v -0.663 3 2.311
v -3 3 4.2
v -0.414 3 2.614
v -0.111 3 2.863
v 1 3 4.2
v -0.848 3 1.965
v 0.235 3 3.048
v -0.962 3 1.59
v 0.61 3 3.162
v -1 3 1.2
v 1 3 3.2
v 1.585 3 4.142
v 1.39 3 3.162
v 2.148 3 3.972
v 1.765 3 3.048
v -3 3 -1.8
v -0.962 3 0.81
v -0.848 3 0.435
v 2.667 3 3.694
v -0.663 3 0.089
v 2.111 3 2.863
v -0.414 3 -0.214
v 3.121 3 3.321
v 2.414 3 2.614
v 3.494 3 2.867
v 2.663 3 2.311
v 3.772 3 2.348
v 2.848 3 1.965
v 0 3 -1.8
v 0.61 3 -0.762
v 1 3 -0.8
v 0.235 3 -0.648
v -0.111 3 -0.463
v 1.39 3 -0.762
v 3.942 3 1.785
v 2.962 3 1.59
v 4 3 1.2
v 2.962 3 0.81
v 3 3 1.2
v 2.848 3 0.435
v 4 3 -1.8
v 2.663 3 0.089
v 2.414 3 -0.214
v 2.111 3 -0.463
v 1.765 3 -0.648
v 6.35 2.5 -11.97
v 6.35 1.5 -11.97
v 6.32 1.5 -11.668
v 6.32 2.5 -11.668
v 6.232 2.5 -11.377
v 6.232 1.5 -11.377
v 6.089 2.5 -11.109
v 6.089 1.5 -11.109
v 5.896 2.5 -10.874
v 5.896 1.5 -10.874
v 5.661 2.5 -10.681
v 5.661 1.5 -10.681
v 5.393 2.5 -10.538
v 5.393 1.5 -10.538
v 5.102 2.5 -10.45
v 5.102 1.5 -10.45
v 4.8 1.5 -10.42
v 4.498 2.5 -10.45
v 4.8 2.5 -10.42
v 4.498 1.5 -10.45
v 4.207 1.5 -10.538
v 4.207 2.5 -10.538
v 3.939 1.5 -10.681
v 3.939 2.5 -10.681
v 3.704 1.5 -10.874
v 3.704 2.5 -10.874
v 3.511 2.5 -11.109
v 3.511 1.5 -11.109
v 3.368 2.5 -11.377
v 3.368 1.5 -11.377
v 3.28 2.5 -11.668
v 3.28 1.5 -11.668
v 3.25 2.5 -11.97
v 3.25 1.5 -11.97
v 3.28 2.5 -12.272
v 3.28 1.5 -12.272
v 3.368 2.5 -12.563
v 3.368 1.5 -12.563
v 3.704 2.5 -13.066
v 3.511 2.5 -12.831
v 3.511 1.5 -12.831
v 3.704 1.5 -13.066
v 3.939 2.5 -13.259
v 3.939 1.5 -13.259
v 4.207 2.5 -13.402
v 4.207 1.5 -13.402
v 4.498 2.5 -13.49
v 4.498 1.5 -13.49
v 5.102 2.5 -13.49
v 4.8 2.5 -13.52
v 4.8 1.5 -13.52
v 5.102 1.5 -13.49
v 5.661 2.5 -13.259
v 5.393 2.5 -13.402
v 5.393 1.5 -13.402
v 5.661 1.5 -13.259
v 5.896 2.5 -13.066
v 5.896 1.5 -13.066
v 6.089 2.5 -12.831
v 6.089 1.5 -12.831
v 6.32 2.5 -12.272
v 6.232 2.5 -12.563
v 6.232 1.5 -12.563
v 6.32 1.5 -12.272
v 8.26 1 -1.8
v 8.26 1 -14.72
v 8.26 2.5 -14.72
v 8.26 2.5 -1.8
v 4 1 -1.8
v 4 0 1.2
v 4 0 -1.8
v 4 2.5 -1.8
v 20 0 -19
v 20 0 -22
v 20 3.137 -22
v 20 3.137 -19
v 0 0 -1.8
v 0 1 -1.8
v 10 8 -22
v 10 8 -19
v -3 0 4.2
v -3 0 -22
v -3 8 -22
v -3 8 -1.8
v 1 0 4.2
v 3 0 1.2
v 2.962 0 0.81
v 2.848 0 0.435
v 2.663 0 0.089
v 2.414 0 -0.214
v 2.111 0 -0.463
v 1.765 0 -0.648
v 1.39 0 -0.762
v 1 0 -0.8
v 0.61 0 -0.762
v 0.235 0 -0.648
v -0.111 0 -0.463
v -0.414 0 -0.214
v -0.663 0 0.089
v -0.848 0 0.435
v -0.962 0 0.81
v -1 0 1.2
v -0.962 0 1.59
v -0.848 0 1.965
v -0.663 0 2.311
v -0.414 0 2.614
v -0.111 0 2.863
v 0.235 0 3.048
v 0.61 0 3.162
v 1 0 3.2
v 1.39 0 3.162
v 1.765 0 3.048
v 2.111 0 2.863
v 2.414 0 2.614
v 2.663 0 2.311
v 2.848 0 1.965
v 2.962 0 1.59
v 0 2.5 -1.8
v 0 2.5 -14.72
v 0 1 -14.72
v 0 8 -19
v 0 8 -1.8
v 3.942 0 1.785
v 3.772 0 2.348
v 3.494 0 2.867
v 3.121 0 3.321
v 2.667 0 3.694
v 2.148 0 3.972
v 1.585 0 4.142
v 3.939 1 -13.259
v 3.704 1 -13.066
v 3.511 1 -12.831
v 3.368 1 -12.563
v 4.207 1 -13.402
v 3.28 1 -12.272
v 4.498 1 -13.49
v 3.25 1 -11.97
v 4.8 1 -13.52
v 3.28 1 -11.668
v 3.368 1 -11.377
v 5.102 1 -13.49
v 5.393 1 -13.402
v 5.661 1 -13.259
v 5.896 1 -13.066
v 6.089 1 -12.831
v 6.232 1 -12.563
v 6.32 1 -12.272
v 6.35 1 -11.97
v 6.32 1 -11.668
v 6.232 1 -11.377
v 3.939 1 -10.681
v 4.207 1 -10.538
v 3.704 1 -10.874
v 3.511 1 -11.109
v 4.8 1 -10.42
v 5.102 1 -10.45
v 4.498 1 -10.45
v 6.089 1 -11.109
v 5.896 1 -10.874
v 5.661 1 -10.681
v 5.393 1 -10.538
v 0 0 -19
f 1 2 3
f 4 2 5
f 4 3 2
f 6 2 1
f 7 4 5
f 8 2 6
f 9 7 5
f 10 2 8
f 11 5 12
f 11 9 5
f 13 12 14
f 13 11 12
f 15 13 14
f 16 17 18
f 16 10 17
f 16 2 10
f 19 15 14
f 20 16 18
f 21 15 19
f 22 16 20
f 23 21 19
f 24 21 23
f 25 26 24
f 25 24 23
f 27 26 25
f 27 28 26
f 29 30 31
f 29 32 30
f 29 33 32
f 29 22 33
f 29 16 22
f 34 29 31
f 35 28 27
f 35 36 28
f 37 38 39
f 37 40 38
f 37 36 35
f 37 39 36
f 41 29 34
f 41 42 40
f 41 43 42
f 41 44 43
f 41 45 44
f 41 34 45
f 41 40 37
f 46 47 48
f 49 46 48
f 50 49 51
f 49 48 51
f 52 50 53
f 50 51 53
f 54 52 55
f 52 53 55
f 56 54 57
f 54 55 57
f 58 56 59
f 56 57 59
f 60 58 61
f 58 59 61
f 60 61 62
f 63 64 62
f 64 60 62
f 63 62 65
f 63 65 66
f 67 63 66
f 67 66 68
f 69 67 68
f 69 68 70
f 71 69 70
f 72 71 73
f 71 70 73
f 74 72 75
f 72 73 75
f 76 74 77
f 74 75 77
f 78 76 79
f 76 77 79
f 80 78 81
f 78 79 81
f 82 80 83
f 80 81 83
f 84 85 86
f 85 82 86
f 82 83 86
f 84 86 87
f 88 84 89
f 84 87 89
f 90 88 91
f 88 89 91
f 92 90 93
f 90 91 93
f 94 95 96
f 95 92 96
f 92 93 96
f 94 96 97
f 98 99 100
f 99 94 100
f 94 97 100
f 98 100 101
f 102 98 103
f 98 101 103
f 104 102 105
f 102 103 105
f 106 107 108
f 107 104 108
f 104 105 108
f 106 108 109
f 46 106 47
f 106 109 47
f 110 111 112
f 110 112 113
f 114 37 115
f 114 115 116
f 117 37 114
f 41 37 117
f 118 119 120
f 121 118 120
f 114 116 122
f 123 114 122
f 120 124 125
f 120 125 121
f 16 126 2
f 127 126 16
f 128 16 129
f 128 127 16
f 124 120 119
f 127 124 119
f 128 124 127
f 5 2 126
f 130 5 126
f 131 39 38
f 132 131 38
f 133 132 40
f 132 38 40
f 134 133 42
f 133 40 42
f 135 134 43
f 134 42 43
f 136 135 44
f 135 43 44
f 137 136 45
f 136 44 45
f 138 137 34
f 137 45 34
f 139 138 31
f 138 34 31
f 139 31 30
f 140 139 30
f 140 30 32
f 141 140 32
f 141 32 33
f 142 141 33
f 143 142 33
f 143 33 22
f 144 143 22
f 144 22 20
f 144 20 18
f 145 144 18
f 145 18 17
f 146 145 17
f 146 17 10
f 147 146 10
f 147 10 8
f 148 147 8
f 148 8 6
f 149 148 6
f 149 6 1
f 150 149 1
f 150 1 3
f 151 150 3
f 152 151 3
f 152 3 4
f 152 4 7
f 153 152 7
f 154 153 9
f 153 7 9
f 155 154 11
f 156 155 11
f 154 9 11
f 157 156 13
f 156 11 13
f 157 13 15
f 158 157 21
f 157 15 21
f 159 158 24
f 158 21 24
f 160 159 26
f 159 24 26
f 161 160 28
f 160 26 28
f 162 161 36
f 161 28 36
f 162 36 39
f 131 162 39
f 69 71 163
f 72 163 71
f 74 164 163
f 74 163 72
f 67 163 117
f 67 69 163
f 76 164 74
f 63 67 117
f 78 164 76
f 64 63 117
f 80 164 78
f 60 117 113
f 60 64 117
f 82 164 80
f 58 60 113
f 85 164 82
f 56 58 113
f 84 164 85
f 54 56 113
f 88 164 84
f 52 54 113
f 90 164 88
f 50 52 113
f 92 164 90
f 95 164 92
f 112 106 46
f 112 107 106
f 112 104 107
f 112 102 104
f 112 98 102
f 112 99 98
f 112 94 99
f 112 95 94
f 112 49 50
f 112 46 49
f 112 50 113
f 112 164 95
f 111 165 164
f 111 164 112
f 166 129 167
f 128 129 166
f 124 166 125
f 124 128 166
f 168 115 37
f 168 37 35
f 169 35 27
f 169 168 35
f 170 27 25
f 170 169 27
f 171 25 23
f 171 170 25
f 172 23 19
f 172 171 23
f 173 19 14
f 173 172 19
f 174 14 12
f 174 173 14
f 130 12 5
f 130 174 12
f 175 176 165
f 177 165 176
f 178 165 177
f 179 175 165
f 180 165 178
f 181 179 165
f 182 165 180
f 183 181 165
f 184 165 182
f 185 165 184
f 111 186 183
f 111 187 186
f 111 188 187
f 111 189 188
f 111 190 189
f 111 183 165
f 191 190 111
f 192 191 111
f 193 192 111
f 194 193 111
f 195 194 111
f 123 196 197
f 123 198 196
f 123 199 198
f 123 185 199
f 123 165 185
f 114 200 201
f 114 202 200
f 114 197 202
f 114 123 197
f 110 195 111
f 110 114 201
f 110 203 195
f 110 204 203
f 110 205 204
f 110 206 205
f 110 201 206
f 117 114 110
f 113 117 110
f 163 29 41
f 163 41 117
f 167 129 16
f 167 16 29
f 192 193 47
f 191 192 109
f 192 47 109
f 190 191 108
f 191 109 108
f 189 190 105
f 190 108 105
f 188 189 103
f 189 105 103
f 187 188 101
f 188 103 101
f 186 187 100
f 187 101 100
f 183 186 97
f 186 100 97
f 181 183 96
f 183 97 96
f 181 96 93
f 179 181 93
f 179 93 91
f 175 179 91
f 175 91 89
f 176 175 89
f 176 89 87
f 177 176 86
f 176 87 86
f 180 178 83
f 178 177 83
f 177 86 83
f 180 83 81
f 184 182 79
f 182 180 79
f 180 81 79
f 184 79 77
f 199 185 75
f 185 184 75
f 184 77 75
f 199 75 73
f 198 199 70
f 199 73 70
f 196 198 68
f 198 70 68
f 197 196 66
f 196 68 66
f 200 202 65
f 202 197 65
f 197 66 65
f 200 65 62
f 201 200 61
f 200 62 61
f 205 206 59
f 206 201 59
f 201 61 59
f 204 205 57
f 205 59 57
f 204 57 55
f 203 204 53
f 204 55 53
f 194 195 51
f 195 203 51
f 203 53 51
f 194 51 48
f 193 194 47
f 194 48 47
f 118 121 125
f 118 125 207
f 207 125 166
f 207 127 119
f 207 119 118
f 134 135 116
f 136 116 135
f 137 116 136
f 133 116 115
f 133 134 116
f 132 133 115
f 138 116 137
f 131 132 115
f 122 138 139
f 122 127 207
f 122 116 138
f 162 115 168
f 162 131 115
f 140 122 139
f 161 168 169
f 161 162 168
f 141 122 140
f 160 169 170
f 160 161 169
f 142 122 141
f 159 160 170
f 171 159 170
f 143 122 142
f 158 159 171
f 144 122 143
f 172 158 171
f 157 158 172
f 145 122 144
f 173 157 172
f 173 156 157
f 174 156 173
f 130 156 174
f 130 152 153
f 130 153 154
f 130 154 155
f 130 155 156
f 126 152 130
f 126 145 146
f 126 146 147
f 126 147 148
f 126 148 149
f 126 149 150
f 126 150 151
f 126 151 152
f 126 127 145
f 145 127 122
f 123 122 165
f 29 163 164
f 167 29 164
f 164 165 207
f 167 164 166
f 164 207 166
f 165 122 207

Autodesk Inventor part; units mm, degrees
ref_plane "YZ Plane" through (0, 0, 0) normal (1, 0, 0) x (0, 1, 0)
ref_plane "XZ Plane" through (0, 0, 0) normal (0, 1, 0) x (-1, 0, 0)
ref_plane "XY Plane" through (0, 0, 0) normal (0, 0, 1) x (1, 0, 0)
sketch "Szkic1" plane through (0, 0, 0) normal (0, 1, 0) x (-1, 0, 0)
  line L0 (0, 0) -> (3, 0)
  line L1 (3, 0) -> (3, -22)
  line L2 (3, -22) -> (0, -22)
  line L3 (0, -22) -> (0, 0)
  line L4 (0, 0) -> (-3, 0)
  line L5 (-3, 0) -> (-3, -5)
  line L6 (-3, -5) -> (0, -5)
  line L7 (0, -5) -> (0, 0)
  line L8 (0, -22) -> (-20, -22)
  line L9 (-20, -22) -> (-20, -19)
  line L10 (-20, -19) -> (0, -19)
  line L11 (0, -19) -> (0, -22)
  dimension "d0" = 3
  dimension "d1" = 22
  dimension "d2" = 3
  dimension "d3" = 5
  dimension "d4" = 20
  dimension "d5" = 3
extrude "Wyciągnięcie proste1" add sketch "Szkic1" along normal blind 8
sketch "Szkic2" plane through (0, 0, -19) normal (0, 0, 1) x (1, 0, 0)
  line L0 (20, 0) -> (20, 8) projected
  line L1 (20, 0) -> (0, 8)
  line L2 (20, 8) -> (-3, 8) projected
  point P0 (0, 0)
extrude "Wyciągnięcie proste2" cut sketch "Szkic2" against normal blind 3
sketch "Szkic3" plane through (-3, 0, 0) normal (0, 0, 1) x (1, 0, 0)
  line L0 (0, 0) -> (0, 8) projected
  line L1 (0, 0) -> (6, 0)
  line L2 (6, 0) -> (6, 8)
  line L3 (6, 8) -> (0, 8)
  line L4 (0, 8) -> (0, 0)
  point P0 (3, 0)
extrude "Wyciągnięcie proste3" add sketch "Szkic3" along normal blind 4.2
sketch "Szkic4" plane through (3, 0, -5) normal (0, 0, -1) x (-1, 0, 0)
  line L0 (0, 0) -> (0, 8) projected
  line L1 (3, 0) -> (3, 8) projected
  line L2 (0, 8) -> (3, 8)
  line L3 (3, 8) -> (3, 0)
  line L4 (3, 0) -> (0, 0)
  line L5 (0, 0) -> (0, 8)
extrude "Wyciągnięcie proste4" cut sketch "Szkic4" against normal blind 3.2
sketch "Szkic6" plane through (3, 0, 4.2) normal (1, 0, 0) x (0, 0, -1)
  line L0 (0, 8) -> (0, 0) projected
  line L1 (23.2, 0) -> (6, 0) projected
  line L2 (0, 8) -> (6, 8)
  line L3 (6, 8) -> (6, 0)
  line L4 (6, 0) -> (0, 0)
  line L5 (0, 0) -> (0, 8)
  point P0 (4.2, 0)
extrude "Wyciągnięcie proste7" add sketch "Szkic6" along normal blind 2
sketch "Szkic7" plane through (0, 8, 0) normal (0, 1, 0) x (1, 0, 0)
  circle A0 centre (1, -1.2) radius 2
  line L0 (5, 1.8) -> (5, -4.2) projected
  line L1 (-3, -4.2) -> (5, -4.2) projected
  line L2 (-3, 22) -> (-3, -4.2) projected
  line L3 (5, -4.2) -> (-3, -4.2)
  line L4 (-3, -4.2) -> (-3, 1.8)
  line L5 (-3, 1.8) -> (5, 1.8)
  line L6 (5, 1.8) -> (5, -4.2)
  point P0 (0, 0)
  dimension "d23" = 4
  dimension "d24" = 4
  dimension "d25" = 3
extrude "Wyciągnięcie proste8" cut sketch "Szkic7" against normal blind 8 contours A0
extrude "Wyciągnięcie proste9" cut sketch "Szkic7" against normal blind 5 contours A0 | L0 L1 L2 L5
sketch "Szkic8" plane through (5, 0, 4.2) normal (1, 0, 0) x (0, 0, -1)
  line L0 (0, 3) -> (0, 0) projected
  line L1 (23.2, 0) -> (6, 0) projected
  line L2 (0, 3) -> (6, 3)
  line L3 (6, 3) -> (6, 0)
  line L4 (6, 0) -> (0, 0)
  line L5 (0, 0) -> (0, 3)
  point P0 (4.2, 0)
extrude "Wyciągnięcie proste10" cut sketch "Szkic8" against normal blind 1
sketch "Szkic9" plane through (-3, 0, -22) normal (0, 0, -1) x (-1, 0, 0)
  line L0 (-3, 8) -> (-23, 0) projected
  line L1 (-23, 0) -> (-23, 3.137)
  line L2 (-3, 8) -> (-13, 8)
  line L3 (-13, 8) -> (-23, 3.137)
  point P0 (-3, 0)
  dimension "d32" = 3.137
extrude "Wyciągnięcie proste11" add sketch "Szkic9" against normal blind 3
sketch "Szkic10" plane through (0, 0, -19) normal (1, 0, 0) x (0, 0, -1)
  line L0 (0, 0) -> (-17.2, 0) projected
  line L1 (-17.2, 0) -> (-4.28, 0)
  line L2 (-4.28, 0) -> (-4.28, 1.5)
  line L3 (-4.28, 1.5) -> (-17.2, 1.5)
  line L4 (-17.2, 1.5) -> (-17.2, 0)
  point P0 (-19, 0)
  point P1 (-4.28, 0)
  dimension "d35" = 12.92
  dimension "d36" = 1.5
extrude "Wyciągnięcie proste12" add sketch "Szkic10" along normal blind 8.26
sketch "Szkic11" plane through (0, 1.5, -1.8) normal (0, 1, 0) x (1, 0, 0)
  circle A0 centre (4.8, 10.17) radius 1.55
  line L0 (4, 0) -> (8.26, 0) projected
  line L1 (0, 0) -> (0, 17.2) projected
  point P0 (0, -1.8)
  dimension "d39" = 3.1
  dimension "d40" = 10.17
  dimension "d41" = 4.8
extrude "Wyciągnięcie proste13" cut sketch "Szkic11" against normal blind 2
fillet "Fillet1" radius 3 1 edges at (4, 1.5, 4.2)
sketch "Szkic12" plane through (0, 1.5, -1.8) normal (0, 1, 0) x (1, 0, 0)
  circle A0 centre (4.8, 10.17) radius 1.55 projected
  line L0 (0, 0) -> (0, 12.92) projected
  line L1 (4, 0) -> (0, 0) projected
  line L2 (4, 0) -> (8.26, 0) projected
  line L3 (8.26, 12.92) -> (8.26, 0) projected
  line L4 (0, 12.92) -> (8.26, 12.92) projected
  point P0 (0, -1.8)
extrude "Wyciągnięcie proste14" add sketch "Szkic12" along normal blind 1
sketch "Szkic13" plane through (0, 0, 0) normal (0, -1, 0) x (1, 0, 0)
  line L0 (8.26, -1.8) -> (8.26, -14.72) projected
  line L1 (8.26, -14.72) -> (0, -14.72) projected
  line L2 (0, -1.8) -> (0, -14.72) projected
  line L3 (4, -1.8) -> (0, -1.8) projected
  line L4 (4, -1.8) -> (8.26, -1.8) projected
  circle A0 centre (4.8, -11.97) radius 1.55 projected
  point P0 (0, 0)
extrude "Wyciągnięcie proste15" cut sketch "Szkic13" against normal blind 1
properties part number "rfmw" material "Tworzywo sztuczne PET"
